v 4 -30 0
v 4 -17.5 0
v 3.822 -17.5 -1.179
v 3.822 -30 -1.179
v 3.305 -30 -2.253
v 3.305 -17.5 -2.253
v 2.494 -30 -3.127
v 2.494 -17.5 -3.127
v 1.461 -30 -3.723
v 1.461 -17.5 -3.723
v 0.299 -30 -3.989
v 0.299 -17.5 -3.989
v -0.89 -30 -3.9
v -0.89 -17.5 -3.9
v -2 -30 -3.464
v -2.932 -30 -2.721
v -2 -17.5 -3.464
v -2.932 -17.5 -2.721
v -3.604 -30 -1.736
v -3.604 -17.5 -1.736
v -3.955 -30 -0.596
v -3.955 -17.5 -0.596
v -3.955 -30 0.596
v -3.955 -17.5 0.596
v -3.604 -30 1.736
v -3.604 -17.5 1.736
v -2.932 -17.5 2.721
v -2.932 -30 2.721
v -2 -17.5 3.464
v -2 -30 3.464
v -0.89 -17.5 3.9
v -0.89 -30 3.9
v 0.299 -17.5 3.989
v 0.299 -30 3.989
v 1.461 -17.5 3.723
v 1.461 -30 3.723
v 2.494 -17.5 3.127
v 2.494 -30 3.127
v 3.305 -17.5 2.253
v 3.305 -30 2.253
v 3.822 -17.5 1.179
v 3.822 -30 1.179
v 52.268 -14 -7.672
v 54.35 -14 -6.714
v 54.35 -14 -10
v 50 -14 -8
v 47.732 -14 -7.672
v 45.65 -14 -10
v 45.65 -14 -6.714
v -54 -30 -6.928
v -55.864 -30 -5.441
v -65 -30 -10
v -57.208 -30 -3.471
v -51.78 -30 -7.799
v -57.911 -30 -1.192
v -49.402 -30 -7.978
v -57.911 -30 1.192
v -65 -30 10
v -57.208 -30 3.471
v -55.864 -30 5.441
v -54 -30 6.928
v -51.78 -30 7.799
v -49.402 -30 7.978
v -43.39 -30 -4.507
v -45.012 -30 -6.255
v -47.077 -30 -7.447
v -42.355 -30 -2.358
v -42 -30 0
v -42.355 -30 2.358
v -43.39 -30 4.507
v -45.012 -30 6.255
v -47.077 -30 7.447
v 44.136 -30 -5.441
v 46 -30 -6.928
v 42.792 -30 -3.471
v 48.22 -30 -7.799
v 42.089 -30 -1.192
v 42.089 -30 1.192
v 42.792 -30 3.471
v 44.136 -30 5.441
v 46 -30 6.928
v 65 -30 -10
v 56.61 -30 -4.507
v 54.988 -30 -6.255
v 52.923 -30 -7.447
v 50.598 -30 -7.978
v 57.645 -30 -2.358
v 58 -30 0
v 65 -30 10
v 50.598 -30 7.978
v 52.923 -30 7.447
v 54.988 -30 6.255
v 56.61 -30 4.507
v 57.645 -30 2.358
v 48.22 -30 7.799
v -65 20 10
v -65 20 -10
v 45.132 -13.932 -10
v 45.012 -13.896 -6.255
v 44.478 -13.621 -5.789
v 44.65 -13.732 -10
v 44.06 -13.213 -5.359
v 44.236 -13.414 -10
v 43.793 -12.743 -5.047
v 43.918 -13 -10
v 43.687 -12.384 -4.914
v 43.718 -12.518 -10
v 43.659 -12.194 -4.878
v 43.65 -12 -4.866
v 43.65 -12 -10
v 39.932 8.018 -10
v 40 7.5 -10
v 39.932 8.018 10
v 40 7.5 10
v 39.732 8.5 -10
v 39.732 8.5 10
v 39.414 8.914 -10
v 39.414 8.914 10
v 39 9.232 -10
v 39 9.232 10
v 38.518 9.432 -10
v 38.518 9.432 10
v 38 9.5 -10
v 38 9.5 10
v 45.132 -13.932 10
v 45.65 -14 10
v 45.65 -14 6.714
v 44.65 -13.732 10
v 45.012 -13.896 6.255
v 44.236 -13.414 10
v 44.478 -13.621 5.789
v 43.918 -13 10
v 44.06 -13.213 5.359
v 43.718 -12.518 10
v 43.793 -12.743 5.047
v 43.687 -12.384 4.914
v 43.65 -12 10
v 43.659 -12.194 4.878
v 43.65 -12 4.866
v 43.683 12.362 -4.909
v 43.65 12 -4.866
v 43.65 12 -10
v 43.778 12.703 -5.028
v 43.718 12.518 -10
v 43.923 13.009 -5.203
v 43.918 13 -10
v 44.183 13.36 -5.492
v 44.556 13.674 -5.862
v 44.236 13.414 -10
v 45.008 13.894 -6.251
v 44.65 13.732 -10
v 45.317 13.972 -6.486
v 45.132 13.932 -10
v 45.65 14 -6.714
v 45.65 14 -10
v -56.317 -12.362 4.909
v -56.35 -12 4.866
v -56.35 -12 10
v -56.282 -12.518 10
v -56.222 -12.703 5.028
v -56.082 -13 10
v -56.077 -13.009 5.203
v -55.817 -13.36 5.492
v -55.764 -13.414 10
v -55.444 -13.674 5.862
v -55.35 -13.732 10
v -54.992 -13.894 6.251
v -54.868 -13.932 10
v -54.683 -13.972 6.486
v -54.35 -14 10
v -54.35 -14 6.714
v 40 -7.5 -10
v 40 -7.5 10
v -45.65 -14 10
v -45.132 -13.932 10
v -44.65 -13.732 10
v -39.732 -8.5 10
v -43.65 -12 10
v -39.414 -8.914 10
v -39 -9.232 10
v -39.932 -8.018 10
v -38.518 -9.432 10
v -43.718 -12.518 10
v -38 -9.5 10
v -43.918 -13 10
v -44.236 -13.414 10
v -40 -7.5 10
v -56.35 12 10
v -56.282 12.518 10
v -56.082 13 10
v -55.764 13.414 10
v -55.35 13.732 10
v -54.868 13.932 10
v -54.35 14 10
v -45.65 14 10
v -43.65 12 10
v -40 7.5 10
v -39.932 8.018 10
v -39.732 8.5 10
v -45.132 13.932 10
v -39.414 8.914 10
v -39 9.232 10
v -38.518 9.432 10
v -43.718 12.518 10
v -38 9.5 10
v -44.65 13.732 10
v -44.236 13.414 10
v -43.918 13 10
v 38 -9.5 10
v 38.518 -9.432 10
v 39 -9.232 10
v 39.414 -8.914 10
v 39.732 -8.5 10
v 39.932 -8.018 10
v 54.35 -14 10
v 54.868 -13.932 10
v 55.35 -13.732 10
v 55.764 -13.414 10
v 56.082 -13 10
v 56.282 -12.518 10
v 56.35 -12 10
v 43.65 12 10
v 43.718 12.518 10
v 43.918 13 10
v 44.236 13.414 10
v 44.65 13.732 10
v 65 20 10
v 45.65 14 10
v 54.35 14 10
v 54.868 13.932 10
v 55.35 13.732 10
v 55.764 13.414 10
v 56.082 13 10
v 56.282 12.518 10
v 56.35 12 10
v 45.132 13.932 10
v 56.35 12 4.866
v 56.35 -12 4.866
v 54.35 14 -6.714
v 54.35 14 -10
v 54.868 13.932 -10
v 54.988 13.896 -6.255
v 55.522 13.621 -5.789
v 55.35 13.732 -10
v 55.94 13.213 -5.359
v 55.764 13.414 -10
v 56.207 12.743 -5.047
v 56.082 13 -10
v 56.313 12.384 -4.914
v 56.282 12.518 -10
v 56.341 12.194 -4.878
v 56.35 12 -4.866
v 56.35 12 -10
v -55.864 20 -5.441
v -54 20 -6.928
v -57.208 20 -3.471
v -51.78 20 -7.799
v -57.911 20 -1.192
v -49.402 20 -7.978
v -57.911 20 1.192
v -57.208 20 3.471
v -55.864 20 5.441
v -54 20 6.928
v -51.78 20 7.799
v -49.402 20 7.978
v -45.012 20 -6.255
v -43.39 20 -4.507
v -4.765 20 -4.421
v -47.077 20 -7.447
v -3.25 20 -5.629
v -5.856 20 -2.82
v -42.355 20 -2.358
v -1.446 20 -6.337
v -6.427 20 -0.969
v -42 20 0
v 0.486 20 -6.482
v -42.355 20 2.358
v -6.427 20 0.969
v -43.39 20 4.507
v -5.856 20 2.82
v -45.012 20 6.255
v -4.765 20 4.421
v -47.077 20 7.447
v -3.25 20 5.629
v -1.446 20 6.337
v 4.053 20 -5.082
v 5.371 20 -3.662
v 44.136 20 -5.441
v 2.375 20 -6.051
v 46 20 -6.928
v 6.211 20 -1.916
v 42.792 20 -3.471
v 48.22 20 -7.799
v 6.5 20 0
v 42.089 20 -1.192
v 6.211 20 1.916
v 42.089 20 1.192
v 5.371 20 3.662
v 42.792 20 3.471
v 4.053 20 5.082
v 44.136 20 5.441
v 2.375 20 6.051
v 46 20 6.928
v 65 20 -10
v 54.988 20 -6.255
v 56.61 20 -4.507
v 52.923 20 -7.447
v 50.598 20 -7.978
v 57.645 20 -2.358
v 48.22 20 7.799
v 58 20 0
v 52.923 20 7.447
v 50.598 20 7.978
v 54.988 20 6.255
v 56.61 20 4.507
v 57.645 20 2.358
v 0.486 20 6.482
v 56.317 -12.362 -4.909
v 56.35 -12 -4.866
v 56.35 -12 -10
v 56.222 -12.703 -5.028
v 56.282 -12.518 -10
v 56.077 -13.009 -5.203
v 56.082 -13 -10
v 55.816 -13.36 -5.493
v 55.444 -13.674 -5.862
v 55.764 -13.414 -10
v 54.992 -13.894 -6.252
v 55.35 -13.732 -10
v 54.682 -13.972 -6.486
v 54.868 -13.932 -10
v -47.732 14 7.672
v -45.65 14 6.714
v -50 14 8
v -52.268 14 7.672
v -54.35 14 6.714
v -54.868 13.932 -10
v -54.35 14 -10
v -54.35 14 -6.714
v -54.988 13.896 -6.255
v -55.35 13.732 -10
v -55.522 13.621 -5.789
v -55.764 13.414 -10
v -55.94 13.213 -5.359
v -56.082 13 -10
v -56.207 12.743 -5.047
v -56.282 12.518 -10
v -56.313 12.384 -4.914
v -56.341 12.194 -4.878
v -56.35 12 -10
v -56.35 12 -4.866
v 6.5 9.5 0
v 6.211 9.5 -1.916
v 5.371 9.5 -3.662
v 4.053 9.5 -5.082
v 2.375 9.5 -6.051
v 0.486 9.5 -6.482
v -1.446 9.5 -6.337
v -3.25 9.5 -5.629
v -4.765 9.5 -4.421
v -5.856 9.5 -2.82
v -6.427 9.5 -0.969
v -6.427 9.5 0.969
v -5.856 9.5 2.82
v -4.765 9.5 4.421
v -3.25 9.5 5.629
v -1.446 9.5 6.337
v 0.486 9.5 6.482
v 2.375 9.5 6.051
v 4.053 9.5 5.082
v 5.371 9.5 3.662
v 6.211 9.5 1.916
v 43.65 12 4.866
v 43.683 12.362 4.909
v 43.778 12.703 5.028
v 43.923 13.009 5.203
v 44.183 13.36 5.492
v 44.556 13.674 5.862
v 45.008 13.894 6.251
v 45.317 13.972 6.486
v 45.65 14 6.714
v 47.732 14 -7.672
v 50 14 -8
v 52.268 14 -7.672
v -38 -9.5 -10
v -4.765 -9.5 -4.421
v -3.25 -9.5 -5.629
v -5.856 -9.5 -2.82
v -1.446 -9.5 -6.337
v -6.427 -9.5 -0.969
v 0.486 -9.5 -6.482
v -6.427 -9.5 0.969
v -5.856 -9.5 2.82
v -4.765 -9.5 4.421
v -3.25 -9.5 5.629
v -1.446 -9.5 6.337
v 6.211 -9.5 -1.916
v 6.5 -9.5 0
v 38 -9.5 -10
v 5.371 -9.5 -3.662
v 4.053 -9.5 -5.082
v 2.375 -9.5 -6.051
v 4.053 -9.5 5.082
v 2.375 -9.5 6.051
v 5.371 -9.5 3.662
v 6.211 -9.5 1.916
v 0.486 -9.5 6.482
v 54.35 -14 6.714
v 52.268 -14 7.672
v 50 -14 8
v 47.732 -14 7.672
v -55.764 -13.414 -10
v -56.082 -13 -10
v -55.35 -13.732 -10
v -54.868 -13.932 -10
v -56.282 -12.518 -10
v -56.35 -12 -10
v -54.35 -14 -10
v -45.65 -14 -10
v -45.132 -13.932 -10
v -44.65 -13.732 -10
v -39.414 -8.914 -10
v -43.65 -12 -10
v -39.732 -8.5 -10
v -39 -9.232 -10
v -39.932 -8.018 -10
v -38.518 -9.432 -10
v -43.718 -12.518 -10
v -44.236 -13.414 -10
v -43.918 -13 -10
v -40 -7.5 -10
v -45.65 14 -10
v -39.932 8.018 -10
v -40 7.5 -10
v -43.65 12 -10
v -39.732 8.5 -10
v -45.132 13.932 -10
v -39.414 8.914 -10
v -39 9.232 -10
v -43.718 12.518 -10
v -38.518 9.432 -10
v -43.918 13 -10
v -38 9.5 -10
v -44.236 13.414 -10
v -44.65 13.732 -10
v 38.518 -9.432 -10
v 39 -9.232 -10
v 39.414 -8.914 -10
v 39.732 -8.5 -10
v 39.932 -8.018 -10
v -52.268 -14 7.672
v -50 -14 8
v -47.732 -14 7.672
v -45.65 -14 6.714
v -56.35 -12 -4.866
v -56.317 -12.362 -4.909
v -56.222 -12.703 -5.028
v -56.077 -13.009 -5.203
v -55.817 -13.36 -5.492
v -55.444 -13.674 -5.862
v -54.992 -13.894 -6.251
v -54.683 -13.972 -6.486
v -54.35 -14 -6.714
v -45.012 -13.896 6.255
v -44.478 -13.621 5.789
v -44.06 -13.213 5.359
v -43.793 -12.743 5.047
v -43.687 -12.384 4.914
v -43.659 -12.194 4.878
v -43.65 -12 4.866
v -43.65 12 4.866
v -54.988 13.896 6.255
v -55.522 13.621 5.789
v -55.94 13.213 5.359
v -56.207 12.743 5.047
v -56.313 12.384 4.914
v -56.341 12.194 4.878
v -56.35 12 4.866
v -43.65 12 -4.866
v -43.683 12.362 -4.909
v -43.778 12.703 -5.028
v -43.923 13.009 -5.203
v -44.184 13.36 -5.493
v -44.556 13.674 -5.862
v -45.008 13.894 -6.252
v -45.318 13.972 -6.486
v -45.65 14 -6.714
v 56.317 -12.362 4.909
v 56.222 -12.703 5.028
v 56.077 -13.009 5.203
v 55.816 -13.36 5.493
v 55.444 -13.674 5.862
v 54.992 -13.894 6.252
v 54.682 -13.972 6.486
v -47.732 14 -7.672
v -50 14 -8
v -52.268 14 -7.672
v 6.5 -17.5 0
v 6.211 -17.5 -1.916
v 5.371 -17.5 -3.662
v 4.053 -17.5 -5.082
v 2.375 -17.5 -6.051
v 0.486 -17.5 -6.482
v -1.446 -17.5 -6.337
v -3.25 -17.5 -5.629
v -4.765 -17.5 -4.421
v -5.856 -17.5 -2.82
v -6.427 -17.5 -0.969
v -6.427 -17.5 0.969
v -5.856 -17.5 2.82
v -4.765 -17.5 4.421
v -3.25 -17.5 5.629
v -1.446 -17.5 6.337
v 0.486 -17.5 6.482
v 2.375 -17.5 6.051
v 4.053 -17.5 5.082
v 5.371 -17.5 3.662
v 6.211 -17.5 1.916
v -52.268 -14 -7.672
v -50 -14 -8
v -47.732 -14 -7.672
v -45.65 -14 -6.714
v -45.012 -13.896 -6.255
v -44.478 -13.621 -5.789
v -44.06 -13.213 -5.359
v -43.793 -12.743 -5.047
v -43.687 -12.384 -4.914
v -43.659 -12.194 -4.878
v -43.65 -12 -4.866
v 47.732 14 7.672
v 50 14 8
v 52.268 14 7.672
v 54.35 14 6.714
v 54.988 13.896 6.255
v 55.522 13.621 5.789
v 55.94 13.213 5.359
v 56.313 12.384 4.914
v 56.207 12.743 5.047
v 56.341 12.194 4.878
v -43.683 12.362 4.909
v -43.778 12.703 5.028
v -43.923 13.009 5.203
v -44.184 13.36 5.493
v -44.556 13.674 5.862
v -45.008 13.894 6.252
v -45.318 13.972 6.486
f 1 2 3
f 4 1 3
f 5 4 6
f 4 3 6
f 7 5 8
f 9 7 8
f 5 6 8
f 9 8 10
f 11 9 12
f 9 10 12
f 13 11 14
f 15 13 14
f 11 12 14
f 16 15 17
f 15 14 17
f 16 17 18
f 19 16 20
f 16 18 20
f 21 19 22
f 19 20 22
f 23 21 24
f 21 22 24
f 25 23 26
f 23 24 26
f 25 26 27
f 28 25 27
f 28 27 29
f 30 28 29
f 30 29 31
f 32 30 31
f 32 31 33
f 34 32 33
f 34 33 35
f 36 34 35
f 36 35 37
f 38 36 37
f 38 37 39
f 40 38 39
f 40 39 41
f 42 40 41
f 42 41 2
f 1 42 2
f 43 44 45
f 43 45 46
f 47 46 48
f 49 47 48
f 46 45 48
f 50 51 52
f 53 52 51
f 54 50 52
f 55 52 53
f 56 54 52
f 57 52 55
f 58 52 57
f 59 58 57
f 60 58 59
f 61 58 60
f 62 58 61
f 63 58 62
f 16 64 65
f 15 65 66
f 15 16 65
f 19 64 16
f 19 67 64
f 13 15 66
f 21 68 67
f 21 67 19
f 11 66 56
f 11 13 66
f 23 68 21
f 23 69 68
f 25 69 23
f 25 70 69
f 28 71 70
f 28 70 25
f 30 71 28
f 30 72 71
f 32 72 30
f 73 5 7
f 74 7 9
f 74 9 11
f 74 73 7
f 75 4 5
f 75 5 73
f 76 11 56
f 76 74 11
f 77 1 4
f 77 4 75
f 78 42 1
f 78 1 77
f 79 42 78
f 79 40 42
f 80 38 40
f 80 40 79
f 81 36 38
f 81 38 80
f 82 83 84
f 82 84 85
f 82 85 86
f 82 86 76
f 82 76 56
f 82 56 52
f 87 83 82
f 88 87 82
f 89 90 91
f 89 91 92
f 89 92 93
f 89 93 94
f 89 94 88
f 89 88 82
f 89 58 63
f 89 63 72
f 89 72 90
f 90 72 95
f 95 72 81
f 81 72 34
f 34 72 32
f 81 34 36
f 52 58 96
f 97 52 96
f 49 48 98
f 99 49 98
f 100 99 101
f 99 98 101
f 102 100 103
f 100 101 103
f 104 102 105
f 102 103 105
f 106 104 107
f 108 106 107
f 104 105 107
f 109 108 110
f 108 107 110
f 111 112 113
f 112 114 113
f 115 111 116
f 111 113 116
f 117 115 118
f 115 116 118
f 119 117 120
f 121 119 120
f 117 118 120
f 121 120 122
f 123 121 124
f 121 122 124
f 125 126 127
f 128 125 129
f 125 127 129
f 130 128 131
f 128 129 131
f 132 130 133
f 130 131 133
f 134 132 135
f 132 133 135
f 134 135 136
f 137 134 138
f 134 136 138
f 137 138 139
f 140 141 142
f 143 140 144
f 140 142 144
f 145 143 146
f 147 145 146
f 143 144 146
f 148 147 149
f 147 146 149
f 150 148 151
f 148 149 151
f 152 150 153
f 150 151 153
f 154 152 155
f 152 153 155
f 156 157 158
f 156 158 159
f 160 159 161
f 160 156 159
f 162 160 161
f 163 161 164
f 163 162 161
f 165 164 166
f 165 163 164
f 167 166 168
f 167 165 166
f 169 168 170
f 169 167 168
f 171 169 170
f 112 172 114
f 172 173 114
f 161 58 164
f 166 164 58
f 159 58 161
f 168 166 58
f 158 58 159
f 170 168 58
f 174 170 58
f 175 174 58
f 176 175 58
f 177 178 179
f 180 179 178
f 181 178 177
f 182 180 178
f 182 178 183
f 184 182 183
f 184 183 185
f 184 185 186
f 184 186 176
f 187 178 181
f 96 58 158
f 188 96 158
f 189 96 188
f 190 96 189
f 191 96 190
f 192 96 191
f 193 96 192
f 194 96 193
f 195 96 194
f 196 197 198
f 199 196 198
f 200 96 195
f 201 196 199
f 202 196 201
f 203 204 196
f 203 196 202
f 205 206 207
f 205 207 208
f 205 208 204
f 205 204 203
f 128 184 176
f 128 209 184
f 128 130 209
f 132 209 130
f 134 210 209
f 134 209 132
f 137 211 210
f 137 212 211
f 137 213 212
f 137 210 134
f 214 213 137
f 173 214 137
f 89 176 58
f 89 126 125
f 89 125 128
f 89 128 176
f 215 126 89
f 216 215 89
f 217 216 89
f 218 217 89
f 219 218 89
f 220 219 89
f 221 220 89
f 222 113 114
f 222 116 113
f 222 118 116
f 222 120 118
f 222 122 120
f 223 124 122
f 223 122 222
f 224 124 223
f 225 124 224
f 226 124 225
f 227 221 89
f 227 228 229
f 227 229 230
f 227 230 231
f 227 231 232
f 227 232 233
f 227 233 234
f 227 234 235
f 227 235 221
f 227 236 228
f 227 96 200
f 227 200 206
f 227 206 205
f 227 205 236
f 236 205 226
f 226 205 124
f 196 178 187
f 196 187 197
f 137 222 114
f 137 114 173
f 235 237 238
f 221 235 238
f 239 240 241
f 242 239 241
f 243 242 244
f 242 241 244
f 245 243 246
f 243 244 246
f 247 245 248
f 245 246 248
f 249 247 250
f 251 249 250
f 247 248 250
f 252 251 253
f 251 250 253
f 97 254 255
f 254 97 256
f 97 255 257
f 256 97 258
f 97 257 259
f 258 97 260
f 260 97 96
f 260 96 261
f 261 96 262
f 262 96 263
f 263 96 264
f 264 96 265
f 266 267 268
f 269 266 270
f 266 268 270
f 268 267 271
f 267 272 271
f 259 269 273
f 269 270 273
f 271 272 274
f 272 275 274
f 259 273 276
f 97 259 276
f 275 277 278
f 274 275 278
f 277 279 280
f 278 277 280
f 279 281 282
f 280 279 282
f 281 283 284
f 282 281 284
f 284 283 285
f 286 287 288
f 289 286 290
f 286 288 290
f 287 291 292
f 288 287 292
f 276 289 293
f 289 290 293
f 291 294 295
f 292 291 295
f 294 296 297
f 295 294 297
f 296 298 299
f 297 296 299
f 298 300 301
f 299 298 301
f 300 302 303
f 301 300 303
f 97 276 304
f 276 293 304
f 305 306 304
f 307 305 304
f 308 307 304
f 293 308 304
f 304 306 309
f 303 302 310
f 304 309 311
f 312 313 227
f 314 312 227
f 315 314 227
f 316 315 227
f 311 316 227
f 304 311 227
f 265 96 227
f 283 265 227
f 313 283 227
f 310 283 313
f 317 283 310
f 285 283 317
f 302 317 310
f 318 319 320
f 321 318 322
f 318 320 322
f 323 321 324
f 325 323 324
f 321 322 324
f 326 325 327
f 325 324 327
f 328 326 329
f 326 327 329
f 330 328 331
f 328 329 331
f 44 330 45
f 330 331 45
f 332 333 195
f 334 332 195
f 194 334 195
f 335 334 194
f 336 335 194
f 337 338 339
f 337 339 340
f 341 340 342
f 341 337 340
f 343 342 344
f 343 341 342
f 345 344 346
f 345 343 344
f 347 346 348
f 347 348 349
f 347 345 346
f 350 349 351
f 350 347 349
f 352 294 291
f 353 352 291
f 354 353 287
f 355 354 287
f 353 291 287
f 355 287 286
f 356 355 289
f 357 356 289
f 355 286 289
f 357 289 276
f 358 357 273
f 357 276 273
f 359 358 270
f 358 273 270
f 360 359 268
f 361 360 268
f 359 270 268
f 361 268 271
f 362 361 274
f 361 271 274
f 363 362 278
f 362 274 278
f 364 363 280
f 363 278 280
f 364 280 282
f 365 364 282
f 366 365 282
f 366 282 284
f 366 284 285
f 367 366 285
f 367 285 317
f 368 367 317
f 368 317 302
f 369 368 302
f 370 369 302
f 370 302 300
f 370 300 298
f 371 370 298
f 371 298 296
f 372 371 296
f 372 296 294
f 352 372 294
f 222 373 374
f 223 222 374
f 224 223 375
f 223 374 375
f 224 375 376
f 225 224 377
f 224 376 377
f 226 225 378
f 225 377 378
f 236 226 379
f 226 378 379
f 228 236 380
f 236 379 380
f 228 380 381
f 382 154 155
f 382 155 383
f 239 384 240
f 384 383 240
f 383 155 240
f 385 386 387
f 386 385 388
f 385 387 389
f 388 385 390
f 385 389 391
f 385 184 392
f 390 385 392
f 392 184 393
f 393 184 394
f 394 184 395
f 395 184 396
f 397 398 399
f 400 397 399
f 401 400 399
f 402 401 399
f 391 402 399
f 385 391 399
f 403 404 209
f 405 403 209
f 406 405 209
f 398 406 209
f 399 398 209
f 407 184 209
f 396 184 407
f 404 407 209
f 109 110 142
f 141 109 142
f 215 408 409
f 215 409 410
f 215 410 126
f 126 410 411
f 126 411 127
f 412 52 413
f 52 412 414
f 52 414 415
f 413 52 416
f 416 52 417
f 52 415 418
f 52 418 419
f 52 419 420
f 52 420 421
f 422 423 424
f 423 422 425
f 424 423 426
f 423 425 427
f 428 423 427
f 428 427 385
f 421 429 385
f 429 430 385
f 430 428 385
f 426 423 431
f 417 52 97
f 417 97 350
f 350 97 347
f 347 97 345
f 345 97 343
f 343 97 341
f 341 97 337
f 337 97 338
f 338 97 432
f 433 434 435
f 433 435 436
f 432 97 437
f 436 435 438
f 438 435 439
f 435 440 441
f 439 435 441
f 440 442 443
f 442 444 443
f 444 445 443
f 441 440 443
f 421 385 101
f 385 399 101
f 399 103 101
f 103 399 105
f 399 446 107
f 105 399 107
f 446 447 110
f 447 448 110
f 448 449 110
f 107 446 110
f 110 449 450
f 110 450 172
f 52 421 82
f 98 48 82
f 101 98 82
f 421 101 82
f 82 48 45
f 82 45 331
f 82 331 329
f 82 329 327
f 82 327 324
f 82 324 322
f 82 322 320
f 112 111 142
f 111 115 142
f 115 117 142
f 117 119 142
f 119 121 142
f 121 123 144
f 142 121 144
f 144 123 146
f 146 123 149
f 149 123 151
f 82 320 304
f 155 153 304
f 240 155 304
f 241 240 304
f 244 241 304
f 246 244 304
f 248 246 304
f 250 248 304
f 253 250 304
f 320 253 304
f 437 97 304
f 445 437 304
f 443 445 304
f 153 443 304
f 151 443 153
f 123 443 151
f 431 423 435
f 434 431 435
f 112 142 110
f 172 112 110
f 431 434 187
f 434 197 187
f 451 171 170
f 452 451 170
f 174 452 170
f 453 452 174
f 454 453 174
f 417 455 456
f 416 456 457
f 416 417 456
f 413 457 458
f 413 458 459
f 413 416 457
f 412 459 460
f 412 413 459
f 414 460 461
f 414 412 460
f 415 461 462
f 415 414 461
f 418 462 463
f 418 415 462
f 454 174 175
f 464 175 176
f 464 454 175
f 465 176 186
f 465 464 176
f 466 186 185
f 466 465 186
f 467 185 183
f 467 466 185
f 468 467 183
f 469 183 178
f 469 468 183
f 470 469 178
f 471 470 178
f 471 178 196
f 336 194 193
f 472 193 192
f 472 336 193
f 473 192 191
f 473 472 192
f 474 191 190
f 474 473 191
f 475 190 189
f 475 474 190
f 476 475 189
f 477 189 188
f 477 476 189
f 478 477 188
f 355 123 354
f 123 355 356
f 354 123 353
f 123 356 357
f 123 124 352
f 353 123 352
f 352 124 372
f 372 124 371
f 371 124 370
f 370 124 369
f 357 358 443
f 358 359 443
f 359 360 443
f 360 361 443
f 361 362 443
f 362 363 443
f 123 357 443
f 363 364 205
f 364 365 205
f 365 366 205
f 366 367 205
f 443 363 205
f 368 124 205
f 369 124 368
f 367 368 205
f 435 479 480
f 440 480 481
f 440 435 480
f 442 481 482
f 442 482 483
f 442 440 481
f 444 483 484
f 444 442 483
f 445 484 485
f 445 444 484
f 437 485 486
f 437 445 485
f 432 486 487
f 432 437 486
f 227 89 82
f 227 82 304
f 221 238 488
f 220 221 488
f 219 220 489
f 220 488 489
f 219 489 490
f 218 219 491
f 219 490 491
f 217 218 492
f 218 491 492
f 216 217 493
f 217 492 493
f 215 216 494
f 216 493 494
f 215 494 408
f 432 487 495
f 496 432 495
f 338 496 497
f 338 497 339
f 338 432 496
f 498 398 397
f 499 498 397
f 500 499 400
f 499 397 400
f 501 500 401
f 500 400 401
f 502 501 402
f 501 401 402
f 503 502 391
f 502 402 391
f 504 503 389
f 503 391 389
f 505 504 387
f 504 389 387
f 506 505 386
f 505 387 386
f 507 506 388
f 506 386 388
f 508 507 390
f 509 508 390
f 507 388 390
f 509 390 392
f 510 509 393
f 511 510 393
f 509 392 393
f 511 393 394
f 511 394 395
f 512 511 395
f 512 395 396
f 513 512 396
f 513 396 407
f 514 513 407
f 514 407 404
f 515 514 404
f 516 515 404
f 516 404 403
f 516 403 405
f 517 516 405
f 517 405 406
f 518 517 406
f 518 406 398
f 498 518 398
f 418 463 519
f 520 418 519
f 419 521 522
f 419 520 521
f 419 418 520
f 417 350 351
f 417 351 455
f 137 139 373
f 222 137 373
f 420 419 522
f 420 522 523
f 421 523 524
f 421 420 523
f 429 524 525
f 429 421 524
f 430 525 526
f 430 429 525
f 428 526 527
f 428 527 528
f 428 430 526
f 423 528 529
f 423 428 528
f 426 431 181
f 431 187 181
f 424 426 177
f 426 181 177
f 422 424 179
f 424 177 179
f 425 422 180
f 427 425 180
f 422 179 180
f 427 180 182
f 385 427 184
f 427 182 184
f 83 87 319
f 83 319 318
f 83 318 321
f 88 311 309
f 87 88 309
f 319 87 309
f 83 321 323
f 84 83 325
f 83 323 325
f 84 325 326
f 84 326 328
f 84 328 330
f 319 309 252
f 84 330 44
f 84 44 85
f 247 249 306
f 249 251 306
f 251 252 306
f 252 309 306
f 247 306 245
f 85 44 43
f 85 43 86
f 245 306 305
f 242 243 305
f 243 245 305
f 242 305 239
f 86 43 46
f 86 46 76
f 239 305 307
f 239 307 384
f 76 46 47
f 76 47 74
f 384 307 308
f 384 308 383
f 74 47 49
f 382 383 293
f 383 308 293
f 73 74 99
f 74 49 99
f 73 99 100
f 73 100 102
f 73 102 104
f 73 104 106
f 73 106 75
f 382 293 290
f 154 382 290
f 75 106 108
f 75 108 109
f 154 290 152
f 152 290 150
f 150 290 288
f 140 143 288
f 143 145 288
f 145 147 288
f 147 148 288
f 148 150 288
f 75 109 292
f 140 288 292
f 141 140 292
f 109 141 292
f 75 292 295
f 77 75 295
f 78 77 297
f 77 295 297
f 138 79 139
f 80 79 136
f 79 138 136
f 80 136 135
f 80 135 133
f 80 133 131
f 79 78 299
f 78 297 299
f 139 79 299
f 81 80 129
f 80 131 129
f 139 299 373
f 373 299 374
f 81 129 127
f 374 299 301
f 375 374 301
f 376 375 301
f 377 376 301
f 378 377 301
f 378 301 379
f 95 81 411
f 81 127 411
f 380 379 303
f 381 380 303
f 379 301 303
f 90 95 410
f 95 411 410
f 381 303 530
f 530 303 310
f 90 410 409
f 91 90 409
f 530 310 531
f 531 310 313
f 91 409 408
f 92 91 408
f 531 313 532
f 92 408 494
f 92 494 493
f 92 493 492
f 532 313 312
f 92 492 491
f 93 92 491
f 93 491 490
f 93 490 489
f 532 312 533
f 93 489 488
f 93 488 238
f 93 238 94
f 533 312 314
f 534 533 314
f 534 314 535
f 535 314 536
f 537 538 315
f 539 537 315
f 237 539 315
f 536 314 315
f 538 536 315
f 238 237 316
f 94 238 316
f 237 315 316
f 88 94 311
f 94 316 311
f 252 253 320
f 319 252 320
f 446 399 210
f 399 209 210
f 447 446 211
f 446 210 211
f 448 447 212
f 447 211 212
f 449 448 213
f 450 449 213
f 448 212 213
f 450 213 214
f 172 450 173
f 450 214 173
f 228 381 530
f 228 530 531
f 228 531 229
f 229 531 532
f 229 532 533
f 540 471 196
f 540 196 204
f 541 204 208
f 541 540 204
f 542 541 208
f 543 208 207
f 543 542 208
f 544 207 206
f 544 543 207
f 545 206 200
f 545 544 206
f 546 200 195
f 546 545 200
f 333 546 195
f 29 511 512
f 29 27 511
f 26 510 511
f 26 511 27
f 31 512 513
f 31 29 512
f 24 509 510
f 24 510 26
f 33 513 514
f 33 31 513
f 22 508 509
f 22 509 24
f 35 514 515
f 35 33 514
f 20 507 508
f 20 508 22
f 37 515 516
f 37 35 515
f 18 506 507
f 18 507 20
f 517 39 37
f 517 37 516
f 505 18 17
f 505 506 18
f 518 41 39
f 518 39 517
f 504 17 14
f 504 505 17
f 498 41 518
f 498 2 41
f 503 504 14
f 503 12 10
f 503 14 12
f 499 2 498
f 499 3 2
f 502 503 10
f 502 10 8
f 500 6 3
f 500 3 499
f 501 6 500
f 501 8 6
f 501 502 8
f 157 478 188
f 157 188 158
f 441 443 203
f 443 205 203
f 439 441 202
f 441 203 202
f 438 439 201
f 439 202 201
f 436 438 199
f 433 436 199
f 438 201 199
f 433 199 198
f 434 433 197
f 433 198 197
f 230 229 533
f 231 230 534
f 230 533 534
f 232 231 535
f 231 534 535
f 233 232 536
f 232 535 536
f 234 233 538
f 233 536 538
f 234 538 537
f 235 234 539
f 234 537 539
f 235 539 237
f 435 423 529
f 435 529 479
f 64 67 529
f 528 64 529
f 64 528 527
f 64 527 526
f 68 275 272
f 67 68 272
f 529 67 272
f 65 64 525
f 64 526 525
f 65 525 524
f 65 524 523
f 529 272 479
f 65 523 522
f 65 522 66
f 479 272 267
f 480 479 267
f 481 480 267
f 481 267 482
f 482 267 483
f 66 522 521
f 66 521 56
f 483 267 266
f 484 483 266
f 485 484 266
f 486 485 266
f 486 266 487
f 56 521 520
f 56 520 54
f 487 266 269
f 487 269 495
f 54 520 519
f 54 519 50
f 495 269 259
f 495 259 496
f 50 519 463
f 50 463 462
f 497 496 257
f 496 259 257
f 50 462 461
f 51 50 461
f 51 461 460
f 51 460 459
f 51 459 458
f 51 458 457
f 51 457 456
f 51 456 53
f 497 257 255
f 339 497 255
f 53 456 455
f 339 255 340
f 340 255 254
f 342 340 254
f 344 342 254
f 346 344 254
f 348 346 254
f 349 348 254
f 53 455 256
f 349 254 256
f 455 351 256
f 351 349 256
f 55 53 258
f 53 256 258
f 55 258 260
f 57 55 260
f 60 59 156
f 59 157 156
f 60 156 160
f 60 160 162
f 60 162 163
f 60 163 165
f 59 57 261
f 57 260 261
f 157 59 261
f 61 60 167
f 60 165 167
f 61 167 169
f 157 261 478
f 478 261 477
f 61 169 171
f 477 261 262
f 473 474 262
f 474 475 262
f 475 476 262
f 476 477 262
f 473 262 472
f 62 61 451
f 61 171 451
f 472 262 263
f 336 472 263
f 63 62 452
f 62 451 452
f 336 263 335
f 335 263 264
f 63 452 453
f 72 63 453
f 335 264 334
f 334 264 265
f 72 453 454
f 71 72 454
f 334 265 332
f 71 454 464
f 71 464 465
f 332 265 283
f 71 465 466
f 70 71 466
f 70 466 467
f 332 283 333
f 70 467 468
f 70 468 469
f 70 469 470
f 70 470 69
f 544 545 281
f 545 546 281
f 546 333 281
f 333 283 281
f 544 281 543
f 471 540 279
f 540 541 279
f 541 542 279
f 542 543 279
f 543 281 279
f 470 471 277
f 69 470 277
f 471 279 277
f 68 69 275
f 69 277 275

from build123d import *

# Parameters (mm, degrees)
SKETCH1_W                = 130
SKETCH1_H                = 50
BOSS_EXTRUDE1_DEPTH      = 10
BOSS_EXTRUDE1_DEPTH_BACK = 10
SKETCH2_R                = 8
CUT_EXTRUDE1_DEPTH       = 1
CUT_EXTRUDE1_DEPTH_BACK  = 51
CUT_EXTRUDE2_DEPTH       = 23
SKETCH5_R                = 4
CUT_EXTRUDE3_DEPTH       = 1.0000001
CUT_EXTRUDE3_DEPTH_BACK  = 51.0000001
SKETCH6_R                = 6.5
CUT_EXTRUDE4_DEPTH       = 37.5


with BuildPart() as part:
    # Sketch1 → Boss-Extrude1 (new body, two sides)
    with BuildSketch(Plane.XY) as boss_extrude1_sk:
        with Locations((0, -5)):
            Rectangle(SKETCH1_W, SKETCH1_H)
        with BuildLine():
            Line((38, 9.5), (-38, 9.5))
            ThreePointArc((-38, 9.5), (-39.414213562, 8.914213562), (-40, 7.5))
            Line((-40, 7.5), (-40, -7.5))
            ThreePointArc((-40, -7.5), (-39.414213562, -8.914213562), (-38, -9.5))
            Line((-38, -9.5), (38, -9.5))
            ThreePointArc((38, -9.5), (39.414213562, -8.914213562), (40, -7.5))
            Line((40, -7.5), (40, 7.5))
            ThreePointArc((40, 7.5), (39.414213562, 8.914213562), (38, 9.5))
        make_face(mode=Mode.SUBTRACT)
    extrude(amount=BOSS_EXTRUDE1_DEPTH)
    extrude(boss_extrude1_sk.sketch, amount=-BOSS_EXTRUDE1_DEPTH_BACK)

    # Sketch2 → Cut-Extrude1 (cut, two sides)
    with BuildSketch(Plane(origin=(0, 20, 0), x_dir=(1, 0, 0), z_dir=(0, 1, 0))) as cut_extrude1_sk:
        with Locations((-50, 0)):
            Circle(SKETCH2_R)
        with Locations((50, 0)):
            Circle(SKETCH2_R)
    extrude(amount=CUT_EXTRUDE1_DEPTH, mode=Mode.SUBTRACT)
    extrude(cut_extrude1_sk.sketch, amount=-CUT_EXTRUDE1_DEPTH_BACK, mode=Mode.SUBTRACT)

    # Sketch4 → Cut-Extrude2 (cut)
    with BuildSketch(Plane(origin=(0, 0, -10), x_dir=(-1, 0, 0), z_dir=(0, 0, -1))):
        with BuildLine():
            Line((-45.65, 14), (-54.35, 14))
            ThreePointArc((-54.35, 14), (-55.764213562, 13.414213562), (-56.35, 12))
            Line((-56.35, 12), (-56.35, -12))
            ThreePointArc((-56.35, -12), (-55.764213562, -13.414213562), (-54.35, -14))
            Line((-54.35, -14), (-45.65, -14))
            ThreePointArc((-45.65, -14), (-44.235786438, -13.414213562), (-43.65, -12))
            Line((-43.65, -12), (-43.65, 12))
            ThreePointArc((-43.65, 12), (-44.235786438, 13.414213562), (-45.65, 14))
        make_face()
        with BuildLine():
            Line((56.35, 12), (56.35, -12))
            ThreePointArc((56.35, -12), (55.764213562, -13.414213562), (54.35, -14))
            Line((54.35, -14), (45.65, -14))
            ThreePointArc((45.65, -14), (44.235786438, -13.414213562), (43.65, -12))
            Line((43.65, -12), (43.65, 12))
            ThreePointArc((43.65, 12), (44.235786438, 13.414213562), (45.65, 14))
            Line((45.65, 14), (54.35, 14))
            ThreePointArc((54.35, 14), (55.764213562, 13.414213562), (56.35, 12))
        make_face()
    extrude(amount=-CUT_EXTRUDE2_DEPTH, mode=Mode.SUBTRACT)

    # Sketch5 → Cut-Extrude3 (cut, two sides)
    with BuildSketch(Plane(origin=(0, 20, 0), x_dir=(1, 0, 0), z_dir=(0, 1, 0))) as cut_extrude3_sk:
        Circle(SKETCH5_R)
    extrude(amount=CUT_EXTRUDE3_DEPTH, mode=Mode.SUBTRACT)
    extrude(cut_extrude3_sk.sketch, amount=-CUT_EXTRUDE3_DEPTH_BACK, mode=Mode.SUBTRACT)

    # Sketch6 → Cut-Extrude4 (cut)
    with BuildSketch(Plane(origin=(0, 20, 0), x_dir=(1, 0, 0), z_dir=(0, 1, 0))):
        Circle(SKETCH6_R)
    extrude(amount=-CUT_EXTRUDE4_DEPTH, mode=Mode.SUBTRACT)


solid = part.part
